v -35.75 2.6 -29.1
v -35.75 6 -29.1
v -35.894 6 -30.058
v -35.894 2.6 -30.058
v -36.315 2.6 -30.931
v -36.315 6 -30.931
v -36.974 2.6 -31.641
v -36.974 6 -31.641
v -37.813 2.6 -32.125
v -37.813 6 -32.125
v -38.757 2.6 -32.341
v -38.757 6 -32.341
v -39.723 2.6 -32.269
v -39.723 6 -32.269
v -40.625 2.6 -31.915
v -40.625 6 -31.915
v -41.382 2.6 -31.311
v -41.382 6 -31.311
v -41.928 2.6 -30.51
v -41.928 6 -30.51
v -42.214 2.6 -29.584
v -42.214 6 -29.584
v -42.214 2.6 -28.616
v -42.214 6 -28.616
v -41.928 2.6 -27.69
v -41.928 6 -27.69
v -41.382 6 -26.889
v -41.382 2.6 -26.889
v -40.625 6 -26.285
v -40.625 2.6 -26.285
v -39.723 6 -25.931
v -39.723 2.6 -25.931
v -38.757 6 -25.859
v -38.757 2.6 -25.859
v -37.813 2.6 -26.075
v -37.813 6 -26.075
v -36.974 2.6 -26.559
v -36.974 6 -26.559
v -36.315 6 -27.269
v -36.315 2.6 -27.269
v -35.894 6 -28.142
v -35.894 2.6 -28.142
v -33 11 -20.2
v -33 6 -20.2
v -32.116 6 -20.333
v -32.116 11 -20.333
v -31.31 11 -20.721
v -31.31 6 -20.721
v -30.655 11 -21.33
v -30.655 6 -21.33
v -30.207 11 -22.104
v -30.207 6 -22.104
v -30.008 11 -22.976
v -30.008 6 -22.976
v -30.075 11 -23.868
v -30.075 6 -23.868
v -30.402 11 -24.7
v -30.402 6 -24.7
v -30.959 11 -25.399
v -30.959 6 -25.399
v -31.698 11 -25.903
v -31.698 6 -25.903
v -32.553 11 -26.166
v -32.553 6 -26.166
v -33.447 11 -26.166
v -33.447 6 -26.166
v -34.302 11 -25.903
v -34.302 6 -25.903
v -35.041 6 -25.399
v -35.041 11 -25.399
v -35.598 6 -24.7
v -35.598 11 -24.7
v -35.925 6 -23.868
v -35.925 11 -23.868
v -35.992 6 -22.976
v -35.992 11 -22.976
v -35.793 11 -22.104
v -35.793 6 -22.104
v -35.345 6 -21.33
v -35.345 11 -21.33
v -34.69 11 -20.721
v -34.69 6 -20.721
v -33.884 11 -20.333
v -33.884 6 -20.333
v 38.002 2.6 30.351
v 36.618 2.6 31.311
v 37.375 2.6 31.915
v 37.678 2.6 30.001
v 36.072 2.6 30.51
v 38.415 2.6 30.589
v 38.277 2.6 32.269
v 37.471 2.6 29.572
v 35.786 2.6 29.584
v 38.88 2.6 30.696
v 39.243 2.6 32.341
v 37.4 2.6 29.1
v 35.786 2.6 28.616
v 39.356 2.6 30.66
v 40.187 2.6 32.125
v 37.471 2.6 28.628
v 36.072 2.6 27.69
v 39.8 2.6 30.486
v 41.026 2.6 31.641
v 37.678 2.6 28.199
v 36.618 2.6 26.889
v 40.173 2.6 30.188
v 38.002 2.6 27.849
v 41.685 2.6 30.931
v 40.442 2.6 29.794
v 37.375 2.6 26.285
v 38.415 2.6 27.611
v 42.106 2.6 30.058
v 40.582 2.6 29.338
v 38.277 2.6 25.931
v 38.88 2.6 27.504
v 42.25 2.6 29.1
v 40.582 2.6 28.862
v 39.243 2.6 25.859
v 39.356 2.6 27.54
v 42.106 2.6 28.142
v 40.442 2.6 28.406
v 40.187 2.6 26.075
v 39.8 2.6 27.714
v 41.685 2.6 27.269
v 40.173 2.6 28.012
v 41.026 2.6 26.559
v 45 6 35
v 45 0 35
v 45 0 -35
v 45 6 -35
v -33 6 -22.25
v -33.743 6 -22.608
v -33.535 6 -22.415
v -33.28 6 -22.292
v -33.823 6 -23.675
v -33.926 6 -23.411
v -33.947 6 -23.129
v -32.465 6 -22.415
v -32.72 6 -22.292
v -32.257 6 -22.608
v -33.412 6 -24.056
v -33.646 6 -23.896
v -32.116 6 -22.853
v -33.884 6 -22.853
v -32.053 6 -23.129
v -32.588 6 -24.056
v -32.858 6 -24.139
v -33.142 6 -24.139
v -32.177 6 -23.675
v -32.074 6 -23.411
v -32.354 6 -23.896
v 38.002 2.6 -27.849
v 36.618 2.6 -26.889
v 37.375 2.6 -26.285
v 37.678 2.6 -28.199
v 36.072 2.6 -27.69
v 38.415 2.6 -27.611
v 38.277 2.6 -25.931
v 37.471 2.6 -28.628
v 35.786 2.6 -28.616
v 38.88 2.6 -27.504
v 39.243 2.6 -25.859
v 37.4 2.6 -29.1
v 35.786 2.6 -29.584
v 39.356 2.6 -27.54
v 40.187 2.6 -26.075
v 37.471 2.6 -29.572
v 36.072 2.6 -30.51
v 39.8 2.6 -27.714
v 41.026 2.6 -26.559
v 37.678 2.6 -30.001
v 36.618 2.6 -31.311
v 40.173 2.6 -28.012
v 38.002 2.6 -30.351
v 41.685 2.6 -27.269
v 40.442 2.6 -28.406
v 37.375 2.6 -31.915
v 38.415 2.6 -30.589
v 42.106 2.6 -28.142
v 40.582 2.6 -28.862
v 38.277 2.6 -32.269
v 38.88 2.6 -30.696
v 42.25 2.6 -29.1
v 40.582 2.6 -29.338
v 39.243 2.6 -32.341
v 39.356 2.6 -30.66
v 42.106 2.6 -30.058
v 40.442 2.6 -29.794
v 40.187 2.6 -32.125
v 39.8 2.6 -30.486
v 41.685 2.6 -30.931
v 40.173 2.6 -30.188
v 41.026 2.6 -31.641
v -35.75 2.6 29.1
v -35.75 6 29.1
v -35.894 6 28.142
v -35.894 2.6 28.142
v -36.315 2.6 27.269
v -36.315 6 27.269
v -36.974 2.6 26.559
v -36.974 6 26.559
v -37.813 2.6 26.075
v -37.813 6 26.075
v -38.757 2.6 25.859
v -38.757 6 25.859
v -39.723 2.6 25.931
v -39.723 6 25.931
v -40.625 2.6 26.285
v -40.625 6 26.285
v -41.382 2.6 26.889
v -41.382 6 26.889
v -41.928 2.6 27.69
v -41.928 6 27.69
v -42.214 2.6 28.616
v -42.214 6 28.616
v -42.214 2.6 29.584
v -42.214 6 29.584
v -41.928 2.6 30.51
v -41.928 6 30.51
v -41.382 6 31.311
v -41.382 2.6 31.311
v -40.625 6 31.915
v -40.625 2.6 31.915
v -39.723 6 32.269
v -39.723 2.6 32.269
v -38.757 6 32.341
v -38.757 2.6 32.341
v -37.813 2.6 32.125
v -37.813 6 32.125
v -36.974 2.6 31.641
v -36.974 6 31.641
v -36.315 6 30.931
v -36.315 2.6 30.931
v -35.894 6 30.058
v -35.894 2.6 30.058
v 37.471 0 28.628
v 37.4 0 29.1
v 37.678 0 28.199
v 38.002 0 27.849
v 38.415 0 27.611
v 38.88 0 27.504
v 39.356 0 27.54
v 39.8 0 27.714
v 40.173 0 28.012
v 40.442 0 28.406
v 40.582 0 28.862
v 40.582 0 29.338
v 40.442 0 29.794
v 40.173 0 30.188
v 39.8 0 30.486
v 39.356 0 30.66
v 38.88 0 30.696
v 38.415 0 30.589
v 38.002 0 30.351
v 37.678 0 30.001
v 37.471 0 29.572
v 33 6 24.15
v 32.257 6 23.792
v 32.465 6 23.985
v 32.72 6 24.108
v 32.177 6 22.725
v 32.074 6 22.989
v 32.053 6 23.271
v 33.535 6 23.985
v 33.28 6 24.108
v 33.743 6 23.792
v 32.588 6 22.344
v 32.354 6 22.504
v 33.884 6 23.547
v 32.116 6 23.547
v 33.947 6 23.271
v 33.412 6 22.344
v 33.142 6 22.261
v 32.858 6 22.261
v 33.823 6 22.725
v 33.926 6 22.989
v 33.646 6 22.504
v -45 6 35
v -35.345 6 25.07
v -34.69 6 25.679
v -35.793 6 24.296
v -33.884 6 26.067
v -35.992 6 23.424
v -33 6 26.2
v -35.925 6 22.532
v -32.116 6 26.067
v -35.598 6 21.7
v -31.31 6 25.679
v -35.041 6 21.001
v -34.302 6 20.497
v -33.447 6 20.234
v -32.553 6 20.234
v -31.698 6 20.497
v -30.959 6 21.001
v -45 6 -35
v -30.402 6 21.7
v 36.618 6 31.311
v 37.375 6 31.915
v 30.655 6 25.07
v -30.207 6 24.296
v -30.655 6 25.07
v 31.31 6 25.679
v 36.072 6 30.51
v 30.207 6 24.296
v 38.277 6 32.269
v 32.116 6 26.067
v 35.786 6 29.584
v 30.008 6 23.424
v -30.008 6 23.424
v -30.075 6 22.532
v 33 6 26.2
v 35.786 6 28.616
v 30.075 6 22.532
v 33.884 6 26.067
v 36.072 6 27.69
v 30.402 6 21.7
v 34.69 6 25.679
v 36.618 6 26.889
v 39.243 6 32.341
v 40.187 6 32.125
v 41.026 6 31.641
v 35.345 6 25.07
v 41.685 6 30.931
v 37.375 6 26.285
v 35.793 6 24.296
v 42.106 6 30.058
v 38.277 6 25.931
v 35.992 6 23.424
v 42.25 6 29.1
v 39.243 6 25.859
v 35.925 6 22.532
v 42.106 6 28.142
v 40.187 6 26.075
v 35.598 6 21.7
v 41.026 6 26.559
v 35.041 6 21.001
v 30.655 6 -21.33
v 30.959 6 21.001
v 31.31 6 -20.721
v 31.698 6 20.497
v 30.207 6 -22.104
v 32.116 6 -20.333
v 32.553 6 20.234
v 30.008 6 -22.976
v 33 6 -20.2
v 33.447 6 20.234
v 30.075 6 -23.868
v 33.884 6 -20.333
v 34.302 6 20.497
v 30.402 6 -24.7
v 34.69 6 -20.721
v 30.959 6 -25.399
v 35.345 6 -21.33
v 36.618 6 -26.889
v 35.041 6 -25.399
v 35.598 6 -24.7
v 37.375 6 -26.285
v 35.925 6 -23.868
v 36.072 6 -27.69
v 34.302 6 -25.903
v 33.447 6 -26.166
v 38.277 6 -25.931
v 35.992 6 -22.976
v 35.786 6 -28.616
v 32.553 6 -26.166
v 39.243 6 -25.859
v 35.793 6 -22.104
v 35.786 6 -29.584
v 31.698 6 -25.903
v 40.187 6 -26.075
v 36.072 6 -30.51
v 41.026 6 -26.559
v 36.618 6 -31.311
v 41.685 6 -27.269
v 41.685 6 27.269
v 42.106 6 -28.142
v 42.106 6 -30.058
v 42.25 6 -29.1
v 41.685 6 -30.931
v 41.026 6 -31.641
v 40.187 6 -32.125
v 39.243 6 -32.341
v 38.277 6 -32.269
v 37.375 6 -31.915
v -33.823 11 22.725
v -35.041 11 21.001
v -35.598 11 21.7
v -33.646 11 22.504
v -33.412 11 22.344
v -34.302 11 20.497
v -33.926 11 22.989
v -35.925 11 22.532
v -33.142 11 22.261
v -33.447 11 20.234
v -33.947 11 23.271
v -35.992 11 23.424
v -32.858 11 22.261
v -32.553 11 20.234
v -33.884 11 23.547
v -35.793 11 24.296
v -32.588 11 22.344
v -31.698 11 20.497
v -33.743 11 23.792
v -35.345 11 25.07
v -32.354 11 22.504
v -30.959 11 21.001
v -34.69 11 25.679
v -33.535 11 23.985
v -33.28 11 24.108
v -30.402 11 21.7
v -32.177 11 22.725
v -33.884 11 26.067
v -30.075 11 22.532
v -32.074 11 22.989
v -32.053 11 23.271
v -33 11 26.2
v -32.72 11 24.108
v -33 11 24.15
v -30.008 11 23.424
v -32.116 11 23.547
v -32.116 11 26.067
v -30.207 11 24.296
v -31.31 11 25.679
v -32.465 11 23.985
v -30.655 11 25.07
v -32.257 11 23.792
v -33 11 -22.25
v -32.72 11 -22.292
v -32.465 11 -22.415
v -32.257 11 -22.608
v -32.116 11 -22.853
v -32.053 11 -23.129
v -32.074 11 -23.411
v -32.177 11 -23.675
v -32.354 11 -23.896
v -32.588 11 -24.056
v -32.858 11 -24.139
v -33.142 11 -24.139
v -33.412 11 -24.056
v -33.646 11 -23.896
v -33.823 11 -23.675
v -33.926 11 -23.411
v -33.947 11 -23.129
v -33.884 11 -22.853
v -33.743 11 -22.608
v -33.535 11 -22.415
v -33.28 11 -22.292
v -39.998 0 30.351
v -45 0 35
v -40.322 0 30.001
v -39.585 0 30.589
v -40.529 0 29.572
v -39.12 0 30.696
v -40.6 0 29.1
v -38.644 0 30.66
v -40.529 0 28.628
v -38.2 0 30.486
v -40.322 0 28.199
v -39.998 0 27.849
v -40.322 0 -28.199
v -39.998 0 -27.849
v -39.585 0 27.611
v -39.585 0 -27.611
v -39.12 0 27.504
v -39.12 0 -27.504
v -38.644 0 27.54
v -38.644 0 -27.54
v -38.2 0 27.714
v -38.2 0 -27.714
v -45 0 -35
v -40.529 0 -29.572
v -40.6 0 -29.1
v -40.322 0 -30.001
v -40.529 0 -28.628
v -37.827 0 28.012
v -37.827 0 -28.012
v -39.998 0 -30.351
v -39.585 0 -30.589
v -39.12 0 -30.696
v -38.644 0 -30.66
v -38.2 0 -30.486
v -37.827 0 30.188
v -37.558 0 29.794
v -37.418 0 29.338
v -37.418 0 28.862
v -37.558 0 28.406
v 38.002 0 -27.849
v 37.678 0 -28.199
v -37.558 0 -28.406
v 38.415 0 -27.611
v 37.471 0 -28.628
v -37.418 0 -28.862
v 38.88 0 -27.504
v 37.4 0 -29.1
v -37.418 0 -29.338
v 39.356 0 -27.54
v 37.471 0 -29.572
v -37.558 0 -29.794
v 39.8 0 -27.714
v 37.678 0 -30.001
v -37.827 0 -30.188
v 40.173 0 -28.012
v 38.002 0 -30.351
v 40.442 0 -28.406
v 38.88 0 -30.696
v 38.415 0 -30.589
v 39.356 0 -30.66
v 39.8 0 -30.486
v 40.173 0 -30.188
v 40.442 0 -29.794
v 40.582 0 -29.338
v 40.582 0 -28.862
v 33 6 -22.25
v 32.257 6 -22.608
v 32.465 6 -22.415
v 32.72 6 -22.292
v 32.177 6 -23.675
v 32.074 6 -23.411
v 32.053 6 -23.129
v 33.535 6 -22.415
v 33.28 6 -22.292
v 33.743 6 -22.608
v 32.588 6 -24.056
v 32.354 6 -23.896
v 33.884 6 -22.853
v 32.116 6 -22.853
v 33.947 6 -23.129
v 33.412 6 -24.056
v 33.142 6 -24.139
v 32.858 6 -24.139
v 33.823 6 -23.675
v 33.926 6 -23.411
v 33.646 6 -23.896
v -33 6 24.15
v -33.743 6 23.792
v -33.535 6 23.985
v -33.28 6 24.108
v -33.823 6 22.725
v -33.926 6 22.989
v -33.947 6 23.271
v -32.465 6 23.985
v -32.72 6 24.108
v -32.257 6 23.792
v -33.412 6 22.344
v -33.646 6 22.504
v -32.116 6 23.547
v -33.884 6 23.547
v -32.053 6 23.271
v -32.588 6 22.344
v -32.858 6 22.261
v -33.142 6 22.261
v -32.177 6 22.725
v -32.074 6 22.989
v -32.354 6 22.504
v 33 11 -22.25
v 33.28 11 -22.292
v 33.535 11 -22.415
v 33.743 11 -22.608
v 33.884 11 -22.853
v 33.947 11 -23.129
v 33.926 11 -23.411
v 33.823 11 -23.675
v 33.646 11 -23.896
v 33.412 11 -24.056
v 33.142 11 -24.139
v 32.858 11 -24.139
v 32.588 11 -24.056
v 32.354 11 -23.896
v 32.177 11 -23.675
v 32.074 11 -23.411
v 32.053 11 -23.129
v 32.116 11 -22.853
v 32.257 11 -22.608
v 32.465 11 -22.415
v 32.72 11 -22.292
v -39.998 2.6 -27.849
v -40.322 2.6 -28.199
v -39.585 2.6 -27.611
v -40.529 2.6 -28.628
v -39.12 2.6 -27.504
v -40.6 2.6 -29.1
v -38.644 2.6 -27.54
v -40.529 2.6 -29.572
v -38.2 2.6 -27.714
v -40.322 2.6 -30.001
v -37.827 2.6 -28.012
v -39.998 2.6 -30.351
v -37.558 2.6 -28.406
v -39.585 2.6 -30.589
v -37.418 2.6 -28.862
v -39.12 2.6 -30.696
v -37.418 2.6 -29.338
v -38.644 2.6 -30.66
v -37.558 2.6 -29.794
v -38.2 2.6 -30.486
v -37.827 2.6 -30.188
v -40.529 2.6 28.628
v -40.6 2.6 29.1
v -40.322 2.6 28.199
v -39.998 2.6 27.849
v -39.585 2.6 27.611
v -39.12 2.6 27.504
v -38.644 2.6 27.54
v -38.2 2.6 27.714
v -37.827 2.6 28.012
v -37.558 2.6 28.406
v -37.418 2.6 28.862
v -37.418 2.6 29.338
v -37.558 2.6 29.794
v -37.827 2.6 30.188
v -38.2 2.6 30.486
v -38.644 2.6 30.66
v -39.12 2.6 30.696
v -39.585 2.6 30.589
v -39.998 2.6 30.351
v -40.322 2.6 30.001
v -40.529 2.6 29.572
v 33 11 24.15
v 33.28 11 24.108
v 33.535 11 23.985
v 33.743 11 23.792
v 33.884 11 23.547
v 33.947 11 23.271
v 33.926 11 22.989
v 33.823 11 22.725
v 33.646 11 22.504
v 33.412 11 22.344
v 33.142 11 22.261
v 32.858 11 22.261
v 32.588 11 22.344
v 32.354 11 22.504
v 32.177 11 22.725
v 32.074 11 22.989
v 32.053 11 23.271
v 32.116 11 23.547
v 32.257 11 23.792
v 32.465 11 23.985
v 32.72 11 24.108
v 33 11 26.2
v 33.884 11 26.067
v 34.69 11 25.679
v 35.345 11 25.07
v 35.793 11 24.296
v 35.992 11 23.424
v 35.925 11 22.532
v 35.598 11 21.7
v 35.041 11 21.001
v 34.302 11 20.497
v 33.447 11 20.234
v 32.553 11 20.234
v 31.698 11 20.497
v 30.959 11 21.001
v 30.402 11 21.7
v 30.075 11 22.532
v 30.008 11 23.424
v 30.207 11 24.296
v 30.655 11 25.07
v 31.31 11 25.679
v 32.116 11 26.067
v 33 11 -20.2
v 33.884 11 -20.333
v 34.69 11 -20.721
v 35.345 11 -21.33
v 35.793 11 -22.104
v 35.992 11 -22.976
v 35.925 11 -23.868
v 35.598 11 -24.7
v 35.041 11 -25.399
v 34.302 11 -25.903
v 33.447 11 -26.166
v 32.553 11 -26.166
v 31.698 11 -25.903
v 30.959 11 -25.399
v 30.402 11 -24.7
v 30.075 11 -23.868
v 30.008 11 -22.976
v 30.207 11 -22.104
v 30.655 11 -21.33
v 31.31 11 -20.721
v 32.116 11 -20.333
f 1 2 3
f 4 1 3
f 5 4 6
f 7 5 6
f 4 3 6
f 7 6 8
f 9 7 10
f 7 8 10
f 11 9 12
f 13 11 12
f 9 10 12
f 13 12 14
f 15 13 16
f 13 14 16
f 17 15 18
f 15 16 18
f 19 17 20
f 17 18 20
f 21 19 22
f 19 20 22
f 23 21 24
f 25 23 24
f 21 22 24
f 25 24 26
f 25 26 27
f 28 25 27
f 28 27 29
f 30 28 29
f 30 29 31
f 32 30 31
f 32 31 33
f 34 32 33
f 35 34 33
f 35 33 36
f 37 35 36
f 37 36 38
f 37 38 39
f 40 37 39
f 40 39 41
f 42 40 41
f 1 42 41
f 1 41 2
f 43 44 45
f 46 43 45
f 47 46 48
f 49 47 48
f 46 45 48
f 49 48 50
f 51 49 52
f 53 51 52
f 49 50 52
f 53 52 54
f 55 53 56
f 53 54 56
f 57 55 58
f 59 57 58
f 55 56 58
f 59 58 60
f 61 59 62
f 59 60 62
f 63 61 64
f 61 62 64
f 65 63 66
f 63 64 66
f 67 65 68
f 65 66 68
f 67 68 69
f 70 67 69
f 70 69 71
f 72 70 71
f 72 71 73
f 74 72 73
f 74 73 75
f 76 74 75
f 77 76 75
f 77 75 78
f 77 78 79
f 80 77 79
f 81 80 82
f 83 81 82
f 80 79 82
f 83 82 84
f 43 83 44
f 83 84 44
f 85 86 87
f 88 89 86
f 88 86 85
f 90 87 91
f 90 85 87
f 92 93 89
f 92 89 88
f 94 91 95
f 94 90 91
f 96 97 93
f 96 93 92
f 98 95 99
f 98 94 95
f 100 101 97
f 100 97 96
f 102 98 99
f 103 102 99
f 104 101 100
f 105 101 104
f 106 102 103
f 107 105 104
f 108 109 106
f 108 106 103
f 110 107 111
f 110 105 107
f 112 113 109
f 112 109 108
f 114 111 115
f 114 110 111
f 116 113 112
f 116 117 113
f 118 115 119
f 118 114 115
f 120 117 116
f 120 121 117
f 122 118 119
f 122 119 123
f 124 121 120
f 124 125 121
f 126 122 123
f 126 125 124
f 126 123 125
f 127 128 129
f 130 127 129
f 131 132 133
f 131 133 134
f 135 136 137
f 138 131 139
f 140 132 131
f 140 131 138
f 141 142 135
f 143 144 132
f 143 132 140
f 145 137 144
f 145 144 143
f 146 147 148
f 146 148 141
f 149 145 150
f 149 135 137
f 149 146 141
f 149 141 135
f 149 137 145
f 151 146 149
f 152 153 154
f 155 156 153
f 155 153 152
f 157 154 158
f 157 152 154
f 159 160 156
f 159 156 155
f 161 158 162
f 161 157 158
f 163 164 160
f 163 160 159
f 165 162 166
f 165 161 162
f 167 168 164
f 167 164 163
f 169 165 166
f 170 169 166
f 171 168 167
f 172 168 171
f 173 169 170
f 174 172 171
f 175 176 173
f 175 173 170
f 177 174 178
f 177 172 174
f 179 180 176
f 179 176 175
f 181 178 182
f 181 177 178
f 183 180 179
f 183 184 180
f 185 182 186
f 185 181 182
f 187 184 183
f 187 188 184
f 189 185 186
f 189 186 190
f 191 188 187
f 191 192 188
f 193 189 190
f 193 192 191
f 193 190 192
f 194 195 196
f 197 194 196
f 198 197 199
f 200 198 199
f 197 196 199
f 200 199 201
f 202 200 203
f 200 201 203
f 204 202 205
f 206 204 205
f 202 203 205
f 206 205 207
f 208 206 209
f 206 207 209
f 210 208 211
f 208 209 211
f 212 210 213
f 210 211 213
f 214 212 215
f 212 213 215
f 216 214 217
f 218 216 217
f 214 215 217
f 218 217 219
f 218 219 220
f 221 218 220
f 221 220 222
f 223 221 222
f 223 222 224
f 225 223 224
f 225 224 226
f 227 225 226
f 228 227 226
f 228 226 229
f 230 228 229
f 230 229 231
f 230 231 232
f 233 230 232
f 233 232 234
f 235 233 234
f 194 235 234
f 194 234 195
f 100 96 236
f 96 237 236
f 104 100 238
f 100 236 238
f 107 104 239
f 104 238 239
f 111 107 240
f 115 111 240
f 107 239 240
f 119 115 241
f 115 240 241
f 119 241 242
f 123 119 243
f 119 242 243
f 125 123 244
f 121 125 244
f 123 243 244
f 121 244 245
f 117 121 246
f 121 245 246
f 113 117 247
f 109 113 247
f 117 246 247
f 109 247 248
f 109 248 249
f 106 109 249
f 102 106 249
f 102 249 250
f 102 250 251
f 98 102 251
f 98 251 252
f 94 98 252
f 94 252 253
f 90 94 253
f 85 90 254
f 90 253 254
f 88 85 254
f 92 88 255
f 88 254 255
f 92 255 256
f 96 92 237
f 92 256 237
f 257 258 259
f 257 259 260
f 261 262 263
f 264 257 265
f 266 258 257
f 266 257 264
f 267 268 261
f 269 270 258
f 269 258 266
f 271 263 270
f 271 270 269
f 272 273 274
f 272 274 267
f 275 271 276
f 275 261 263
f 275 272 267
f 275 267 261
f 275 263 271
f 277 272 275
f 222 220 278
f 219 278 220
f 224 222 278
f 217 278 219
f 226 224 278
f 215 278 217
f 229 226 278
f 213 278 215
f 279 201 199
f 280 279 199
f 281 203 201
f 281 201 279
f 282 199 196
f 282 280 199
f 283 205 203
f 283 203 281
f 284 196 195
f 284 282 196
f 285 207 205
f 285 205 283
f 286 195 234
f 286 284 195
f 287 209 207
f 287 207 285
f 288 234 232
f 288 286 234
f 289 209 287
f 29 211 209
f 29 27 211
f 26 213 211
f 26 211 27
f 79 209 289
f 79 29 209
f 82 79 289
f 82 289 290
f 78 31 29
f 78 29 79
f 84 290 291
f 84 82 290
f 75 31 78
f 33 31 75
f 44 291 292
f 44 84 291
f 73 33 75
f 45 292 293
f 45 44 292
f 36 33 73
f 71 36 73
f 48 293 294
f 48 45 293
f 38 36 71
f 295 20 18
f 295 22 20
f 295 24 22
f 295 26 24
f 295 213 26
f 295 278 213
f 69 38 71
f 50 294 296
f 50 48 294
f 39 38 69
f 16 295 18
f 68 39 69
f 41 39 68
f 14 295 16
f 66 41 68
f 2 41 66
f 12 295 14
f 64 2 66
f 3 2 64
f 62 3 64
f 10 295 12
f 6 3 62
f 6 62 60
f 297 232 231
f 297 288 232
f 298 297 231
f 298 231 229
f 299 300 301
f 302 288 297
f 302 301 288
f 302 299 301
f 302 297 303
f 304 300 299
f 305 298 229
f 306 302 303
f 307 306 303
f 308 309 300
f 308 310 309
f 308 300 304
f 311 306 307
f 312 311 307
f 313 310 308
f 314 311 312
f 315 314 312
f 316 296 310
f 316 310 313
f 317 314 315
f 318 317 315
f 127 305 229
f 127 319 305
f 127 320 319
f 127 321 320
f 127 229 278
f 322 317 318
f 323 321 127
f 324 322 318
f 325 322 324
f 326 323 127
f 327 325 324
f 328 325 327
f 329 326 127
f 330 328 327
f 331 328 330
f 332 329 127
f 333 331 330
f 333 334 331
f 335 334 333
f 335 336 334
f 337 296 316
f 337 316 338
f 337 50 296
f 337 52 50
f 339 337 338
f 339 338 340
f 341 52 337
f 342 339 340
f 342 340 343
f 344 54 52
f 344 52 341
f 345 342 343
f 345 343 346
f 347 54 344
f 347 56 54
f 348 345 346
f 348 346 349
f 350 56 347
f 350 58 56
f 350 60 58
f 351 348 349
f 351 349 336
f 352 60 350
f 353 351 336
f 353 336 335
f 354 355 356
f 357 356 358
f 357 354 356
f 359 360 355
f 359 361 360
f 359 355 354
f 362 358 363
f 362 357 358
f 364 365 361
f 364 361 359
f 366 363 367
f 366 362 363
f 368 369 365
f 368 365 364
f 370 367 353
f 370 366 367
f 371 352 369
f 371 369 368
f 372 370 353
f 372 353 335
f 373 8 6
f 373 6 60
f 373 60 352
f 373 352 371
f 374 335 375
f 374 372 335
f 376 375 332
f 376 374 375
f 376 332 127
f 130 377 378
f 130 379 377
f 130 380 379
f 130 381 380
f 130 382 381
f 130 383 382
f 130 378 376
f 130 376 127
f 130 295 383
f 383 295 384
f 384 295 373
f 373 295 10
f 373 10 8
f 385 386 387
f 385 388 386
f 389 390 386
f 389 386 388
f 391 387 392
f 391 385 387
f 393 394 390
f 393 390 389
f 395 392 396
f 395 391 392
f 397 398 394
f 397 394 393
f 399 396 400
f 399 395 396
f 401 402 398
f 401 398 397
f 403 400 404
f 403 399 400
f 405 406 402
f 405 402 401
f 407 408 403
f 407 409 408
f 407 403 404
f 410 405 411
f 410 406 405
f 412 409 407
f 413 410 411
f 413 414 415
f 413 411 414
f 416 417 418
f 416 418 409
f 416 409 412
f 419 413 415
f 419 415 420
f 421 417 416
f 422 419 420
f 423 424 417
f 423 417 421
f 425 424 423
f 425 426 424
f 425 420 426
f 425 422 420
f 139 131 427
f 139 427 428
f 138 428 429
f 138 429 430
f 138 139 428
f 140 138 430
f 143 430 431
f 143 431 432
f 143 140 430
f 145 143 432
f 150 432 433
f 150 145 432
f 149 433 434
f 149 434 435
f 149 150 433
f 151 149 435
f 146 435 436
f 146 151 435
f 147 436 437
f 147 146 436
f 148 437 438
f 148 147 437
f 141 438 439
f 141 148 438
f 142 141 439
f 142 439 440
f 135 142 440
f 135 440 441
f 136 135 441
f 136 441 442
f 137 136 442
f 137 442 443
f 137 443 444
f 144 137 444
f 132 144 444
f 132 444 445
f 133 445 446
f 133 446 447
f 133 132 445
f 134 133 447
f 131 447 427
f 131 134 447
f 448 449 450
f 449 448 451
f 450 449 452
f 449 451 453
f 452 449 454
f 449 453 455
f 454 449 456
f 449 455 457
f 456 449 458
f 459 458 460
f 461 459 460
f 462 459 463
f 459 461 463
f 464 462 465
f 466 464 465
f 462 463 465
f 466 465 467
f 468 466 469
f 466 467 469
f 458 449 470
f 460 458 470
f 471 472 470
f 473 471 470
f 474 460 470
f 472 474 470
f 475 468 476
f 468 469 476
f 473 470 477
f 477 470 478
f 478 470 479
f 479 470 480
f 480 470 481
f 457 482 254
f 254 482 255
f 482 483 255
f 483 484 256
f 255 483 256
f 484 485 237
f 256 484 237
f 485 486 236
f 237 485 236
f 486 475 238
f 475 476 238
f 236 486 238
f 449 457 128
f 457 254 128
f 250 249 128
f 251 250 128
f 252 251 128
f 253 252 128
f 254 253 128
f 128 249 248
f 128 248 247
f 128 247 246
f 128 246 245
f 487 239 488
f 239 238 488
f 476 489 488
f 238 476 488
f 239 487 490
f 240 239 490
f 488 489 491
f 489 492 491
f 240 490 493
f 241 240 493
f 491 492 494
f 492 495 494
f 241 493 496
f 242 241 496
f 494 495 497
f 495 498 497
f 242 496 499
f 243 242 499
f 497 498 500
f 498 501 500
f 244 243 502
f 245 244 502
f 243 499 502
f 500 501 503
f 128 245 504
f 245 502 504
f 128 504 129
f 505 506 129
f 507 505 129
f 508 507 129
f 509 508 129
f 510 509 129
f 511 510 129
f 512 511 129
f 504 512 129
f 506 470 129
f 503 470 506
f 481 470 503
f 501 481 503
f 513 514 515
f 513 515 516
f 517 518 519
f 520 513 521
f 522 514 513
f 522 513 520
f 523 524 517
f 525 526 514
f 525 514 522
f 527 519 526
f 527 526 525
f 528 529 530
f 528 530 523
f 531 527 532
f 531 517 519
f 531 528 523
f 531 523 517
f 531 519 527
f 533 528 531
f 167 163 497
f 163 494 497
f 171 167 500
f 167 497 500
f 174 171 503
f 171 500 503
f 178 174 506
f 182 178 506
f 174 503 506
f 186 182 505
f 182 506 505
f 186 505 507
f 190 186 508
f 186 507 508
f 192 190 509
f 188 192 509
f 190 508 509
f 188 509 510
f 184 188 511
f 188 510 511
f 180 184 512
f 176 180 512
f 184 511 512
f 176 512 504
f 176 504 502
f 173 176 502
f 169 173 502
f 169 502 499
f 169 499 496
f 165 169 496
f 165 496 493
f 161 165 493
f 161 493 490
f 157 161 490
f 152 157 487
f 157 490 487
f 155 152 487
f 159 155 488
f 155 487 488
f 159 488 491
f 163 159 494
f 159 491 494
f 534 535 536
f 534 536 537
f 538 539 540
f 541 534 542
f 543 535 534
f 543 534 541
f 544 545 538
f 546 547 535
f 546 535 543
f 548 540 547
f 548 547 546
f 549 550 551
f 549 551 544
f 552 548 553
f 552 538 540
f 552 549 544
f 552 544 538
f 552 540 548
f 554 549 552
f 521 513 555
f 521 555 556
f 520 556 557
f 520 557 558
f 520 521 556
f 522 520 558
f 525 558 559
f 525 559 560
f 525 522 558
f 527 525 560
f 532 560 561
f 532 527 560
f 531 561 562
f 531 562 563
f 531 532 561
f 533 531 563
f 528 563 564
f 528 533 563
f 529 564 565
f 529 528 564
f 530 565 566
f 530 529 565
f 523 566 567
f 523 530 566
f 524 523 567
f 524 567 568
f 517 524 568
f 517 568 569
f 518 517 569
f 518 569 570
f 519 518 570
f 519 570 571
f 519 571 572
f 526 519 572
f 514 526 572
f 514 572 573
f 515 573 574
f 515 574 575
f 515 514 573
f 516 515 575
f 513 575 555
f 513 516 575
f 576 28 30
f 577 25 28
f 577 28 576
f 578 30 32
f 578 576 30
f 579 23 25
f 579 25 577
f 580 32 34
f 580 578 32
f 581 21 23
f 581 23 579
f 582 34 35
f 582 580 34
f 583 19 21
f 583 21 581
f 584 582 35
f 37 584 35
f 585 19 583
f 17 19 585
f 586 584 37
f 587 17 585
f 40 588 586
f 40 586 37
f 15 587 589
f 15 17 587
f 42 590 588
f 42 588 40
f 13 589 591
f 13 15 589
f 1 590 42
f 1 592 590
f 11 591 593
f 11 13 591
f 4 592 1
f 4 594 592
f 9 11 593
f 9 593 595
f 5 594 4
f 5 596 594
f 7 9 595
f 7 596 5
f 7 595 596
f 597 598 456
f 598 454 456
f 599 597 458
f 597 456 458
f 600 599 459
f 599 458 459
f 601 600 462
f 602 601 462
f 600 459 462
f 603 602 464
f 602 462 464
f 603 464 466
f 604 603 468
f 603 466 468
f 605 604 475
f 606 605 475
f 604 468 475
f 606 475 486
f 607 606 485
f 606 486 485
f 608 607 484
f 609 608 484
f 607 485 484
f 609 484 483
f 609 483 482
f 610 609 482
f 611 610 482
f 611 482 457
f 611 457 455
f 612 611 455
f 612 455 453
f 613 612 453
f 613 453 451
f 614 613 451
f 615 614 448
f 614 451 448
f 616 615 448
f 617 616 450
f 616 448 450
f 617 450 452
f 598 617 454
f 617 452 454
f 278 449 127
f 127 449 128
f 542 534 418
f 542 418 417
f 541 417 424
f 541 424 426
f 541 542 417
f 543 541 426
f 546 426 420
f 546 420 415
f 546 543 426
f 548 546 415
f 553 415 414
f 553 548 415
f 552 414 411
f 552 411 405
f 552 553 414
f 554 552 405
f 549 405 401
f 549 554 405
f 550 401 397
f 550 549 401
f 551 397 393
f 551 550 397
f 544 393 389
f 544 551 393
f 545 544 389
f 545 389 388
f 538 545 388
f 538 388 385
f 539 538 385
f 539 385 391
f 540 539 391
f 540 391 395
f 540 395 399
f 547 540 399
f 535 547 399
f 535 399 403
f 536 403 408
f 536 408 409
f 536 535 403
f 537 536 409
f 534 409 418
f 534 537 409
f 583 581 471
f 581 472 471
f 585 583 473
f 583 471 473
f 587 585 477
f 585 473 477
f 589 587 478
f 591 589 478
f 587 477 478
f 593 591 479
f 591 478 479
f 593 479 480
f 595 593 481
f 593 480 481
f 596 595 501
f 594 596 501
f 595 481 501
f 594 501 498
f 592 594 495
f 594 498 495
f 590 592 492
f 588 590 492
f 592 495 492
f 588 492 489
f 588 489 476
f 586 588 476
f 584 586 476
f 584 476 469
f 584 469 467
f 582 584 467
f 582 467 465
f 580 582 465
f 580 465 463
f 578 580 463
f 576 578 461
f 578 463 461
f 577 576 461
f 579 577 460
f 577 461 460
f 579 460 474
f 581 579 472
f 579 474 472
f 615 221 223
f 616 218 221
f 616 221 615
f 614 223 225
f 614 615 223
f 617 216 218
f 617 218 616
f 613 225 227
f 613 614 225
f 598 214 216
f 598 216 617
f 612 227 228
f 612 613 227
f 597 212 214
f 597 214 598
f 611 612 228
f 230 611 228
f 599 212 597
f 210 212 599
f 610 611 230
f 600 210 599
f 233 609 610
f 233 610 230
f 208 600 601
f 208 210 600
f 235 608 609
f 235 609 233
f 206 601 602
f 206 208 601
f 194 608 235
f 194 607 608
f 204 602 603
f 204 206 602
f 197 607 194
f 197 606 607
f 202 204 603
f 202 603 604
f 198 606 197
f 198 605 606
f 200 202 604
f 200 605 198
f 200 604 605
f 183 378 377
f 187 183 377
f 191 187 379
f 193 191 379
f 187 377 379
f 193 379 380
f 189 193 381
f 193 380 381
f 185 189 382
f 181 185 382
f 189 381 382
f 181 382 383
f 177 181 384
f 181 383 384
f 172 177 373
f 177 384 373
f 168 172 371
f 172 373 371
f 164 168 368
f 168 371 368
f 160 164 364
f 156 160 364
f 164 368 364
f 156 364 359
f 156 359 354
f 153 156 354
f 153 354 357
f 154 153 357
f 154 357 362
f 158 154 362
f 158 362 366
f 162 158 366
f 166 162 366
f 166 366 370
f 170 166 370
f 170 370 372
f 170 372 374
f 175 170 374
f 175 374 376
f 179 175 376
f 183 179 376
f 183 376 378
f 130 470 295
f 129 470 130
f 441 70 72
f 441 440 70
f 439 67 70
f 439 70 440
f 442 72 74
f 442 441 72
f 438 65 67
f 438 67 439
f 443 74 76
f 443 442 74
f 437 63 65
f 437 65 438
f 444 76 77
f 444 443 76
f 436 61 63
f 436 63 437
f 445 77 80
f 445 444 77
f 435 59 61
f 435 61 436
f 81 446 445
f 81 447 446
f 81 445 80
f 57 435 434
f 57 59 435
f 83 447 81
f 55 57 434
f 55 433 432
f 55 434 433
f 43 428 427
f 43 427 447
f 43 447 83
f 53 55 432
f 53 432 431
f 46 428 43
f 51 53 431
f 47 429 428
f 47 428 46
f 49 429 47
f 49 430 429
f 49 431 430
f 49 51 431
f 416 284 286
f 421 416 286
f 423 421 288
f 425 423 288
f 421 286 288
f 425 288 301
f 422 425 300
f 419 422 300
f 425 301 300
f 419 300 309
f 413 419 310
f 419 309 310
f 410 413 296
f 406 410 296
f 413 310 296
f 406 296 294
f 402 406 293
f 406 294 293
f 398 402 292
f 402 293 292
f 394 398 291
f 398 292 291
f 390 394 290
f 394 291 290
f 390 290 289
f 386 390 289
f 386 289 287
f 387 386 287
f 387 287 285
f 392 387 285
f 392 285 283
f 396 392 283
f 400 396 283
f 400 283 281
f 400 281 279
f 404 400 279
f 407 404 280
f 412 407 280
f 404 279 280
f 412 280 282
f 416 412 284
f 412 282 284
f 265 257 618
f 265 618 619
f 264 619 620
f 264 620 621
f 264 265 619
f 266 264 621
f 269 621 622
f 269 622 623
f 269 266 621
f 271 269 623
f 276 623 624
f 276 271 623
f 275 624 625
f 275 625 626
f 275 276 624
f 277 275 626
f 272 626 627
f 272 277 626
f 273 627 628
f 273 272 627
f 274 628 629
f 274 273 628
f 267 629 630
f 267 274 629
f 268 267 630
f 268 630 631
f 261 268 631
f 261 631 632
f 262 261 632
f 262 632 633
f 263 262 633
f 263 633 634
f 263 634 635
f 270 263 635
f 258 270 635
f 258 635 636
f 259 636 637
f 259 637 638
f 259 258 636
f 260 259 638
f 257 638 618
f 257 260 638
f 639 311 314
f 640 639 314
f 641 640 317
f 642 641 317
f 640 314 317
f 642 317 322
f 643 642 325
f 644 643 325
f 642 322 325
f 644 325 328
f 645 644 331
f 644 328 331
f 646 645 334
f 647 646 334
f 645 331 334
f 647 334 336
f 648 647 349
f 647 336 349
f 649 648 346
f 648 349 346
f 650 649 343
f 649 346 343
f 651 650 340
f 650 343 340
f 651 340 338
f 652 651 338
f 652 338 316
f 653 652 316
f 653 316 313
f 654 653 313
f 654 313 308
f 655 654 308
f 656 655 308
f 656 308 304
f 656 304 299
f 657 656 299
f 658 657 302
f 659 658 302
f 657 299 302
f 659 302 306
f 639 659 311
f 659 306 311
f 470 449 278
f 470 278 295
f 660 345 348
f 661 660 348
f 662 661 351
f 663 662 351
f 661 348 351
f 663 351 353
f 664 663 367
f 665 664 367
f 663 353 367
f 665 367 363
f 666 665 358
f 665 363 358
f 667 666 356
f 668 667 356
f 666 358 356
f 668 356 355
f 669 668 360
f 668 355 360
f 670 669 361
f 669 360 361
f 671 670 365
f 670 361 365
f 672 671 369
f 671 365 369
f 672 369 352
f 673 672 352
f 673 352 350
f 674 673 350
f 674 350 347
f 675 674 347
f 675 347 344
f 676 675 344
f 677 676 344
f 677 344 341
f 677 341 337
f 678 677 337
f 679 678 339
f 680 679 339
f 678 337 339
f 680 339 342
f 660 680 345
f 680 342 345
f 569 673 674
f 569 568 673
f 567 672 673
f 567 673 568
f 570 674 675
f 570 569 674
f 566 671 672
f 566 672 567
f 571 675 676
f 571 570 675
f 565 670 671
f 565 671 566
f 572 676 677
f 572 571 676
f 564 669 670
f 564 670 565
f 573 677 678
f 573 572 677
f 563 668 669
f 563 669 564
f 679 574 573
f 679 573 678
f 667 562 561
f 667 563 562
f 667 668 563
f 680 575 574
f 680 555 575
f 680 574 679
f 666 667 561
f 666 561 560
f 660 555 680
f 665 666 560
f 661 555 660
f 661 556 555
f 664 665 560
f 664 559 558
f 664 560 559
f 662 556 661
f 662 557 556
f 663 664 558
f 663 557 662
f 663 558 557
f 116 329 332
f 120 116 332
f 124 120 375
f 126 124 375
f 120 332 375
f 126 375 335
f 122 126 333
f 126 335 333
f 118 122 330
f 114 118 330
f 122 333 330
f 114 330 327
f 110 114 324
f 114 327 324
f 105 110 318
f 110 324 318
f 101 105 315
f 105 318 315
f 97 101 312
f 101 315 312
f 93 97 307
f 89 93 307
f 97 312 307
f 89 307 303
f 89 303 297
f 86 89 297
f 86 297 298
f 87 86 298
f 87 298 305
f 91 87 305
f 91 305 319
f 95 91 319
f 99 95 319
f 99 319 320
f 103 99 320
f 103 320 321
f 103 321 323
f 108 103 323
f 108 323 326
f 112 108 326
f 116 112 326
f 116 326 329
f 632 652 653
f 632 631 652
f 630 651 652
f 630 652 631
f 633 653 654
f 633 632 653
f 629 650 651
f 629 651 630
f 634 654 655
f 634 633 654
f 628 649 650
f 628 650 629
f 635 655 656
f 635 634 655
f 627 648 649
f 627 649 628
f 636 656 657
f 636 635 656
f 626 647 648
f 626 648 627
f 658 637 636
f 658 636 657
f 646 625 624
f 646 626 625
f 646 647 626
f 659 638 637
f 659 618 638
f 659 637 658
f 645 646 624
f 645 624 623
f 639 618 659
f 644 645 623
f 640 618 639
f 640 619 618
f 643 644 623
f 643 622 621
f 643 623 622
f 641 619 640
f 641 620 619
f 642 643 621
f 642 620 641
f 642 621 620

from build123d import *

# Parameters (mm, degrees)
SZKIC1_W                                            = 90
SZKIC1_H                                            = 70
DODANIE_WYCI_GNI_CIE1_DEPTH                         = 6
SZKIC2_R                                            = 3
SZKIC2_R_2                                          = 0.95
DODANIE_WYCI_GNI_CIE2_DEPTH                         = 5
CBORE_FOR_M3_HEX_SOCKET_HEAD_CAP_SCREW1_D           = 3.2
CBORE_FOR_M3_HEX_SOCKET_HEAD_CAP_SCREW1_DEPTH       = 17.7
CBORE_FOR_M3_HEX_SOCKET_HEAD_CAP_SCREW1_CBORE_D     = 6.5
CBORE_FOR_M3_HEX_SOCKET_HEAD_CAP_SCREW1_CBORE_DEPTH = 3.4
CBORE_FOR_M3_HEX_SOCKET_HEAD_CAP_SCREW1_TIP         = 0.96137699


with BuildPart() as part:
    # Szkic1 → Dodanie-wyciągnięcie1 (new body)
    with BuildSketch(Plane(origin=(0, 0, 0), x_dir=(1, 0, 0), z_dir=(0, 1, 0))):
        Rectangle(SZKIC1_W, SZKIC1_H)
    extrude(amount=DODANIE_WYCI_GNI_CIE1_DEPTH)

    # Szkic2 → Dodanie-wyciągnięcie2 (add)
    # profile 1 of 4: a face of its own
    with BuildSketch(Plane(origin=(0, 6, 0), x_dir=(1, 0, 0), z_dir=(0, 1, 0))):
        with Locations(Location((-33, 23.2, 0), (0, 0, 270))):
            Circle(SZKIC2_R)
        with Locations(Location((-33, 23.2, 0), (0, 0, 270))):
            Circle(SZKIC2_R_2, mode=Mode.SUBTRACT)
    # profile 2 of 4: a face of its own
    with BuildSketch(Plane(origin=(0, 6, 0), x_dir=(1, 0, 0), z_dir=(0, 1, 0))):
        with Locations(Location((-33, -23.2, 0), (0, 0, 270))):
            Circle(SZKIC2_R)
        with Locations(Location((-33, -23.2, 0), (0, 0, 270))):
            Circle(SZKIC2_R_2, mode=Mode.SUBTRACT)
    # profile 3 of 4: a face of its own
    with BuildSketch(Plane(origin=(0, 6, 0), x_dir=(1, 0, 0), z_dir=(0, 1, 0))):
        with Locations(Location((33, -23.2, 0), (0, 0, 270))):
            Circle(SZKIC2_R)
        with Locations(Location((33, -23.2, 0), (0, 0, 270))):
            Circle(SZKIC2_R_2, mode=Mode.SUBTRACT)
    # profile 4 of 4: a face of its own
    with BuildSketch(Plane(origin=(0, 6, 0), x_dir=(1, 0, 0), z_dir=(0, 1, 0))):
        with Locations(Location((33, 23.2, 0), (0, 0, 270))):
            Circle(SZKIC2_R)
        with Locations(Location((33, 23.2, 0), (0, 0, 270))):
            Circle(SZKIC2_R_2, mode=Mode.SUBTRACT)
    extrude(amount=DODANIE_WYCI_GNI_CIE2_DEPTH)

    # CBORE for M3 Hex Socket Head Cap Screw1
    with Locations(Plane(origin=(0, 6, 0), x_dir=(1, 0, 0), z_dir=(0, 1, 0))):
        with Locations((-39, 29.1), (-39, -29.1), (39, 29.1), (39, -29.1)):
            CounterBoreHole(CBORE_FOR_M3_HEX_SOCKET_HEAD_CAP_SCREW1_D / 2, CBORE_FOR_M3_HEX_SOCKET_HEAD_CAP_SCREW1_CBORE_D / 2, CBORE_FOR_M3_HEX_SOCKET_HEAD_CAP_SCREW1_CBORE_DEPTH, depth=CBORE_FOR_M3_HEX_SOCKET_HEAD_CAP_SCREW1_DEPTH)
            with Locations((0, 0, -(CBORE_FOR_M3_HEX_SOCKET_HEAD_CAP_SCREW1_DEPTH + CBORE_FOR_M3_HEX_SOCKET_HEAD_CAP_SCREW1_TIP / 2))):  # 118° drill point
                Cone(0, CBORE_FOR_M3_HEX_SOCKET_HEAD_CAP_SCREW1_D / 2, CBORE_FOR_M3_HEX_SOCKET_HEAD_CAP_SCREW1_TIP, mode=Mode.SUBTRACT)


solid = part.part
